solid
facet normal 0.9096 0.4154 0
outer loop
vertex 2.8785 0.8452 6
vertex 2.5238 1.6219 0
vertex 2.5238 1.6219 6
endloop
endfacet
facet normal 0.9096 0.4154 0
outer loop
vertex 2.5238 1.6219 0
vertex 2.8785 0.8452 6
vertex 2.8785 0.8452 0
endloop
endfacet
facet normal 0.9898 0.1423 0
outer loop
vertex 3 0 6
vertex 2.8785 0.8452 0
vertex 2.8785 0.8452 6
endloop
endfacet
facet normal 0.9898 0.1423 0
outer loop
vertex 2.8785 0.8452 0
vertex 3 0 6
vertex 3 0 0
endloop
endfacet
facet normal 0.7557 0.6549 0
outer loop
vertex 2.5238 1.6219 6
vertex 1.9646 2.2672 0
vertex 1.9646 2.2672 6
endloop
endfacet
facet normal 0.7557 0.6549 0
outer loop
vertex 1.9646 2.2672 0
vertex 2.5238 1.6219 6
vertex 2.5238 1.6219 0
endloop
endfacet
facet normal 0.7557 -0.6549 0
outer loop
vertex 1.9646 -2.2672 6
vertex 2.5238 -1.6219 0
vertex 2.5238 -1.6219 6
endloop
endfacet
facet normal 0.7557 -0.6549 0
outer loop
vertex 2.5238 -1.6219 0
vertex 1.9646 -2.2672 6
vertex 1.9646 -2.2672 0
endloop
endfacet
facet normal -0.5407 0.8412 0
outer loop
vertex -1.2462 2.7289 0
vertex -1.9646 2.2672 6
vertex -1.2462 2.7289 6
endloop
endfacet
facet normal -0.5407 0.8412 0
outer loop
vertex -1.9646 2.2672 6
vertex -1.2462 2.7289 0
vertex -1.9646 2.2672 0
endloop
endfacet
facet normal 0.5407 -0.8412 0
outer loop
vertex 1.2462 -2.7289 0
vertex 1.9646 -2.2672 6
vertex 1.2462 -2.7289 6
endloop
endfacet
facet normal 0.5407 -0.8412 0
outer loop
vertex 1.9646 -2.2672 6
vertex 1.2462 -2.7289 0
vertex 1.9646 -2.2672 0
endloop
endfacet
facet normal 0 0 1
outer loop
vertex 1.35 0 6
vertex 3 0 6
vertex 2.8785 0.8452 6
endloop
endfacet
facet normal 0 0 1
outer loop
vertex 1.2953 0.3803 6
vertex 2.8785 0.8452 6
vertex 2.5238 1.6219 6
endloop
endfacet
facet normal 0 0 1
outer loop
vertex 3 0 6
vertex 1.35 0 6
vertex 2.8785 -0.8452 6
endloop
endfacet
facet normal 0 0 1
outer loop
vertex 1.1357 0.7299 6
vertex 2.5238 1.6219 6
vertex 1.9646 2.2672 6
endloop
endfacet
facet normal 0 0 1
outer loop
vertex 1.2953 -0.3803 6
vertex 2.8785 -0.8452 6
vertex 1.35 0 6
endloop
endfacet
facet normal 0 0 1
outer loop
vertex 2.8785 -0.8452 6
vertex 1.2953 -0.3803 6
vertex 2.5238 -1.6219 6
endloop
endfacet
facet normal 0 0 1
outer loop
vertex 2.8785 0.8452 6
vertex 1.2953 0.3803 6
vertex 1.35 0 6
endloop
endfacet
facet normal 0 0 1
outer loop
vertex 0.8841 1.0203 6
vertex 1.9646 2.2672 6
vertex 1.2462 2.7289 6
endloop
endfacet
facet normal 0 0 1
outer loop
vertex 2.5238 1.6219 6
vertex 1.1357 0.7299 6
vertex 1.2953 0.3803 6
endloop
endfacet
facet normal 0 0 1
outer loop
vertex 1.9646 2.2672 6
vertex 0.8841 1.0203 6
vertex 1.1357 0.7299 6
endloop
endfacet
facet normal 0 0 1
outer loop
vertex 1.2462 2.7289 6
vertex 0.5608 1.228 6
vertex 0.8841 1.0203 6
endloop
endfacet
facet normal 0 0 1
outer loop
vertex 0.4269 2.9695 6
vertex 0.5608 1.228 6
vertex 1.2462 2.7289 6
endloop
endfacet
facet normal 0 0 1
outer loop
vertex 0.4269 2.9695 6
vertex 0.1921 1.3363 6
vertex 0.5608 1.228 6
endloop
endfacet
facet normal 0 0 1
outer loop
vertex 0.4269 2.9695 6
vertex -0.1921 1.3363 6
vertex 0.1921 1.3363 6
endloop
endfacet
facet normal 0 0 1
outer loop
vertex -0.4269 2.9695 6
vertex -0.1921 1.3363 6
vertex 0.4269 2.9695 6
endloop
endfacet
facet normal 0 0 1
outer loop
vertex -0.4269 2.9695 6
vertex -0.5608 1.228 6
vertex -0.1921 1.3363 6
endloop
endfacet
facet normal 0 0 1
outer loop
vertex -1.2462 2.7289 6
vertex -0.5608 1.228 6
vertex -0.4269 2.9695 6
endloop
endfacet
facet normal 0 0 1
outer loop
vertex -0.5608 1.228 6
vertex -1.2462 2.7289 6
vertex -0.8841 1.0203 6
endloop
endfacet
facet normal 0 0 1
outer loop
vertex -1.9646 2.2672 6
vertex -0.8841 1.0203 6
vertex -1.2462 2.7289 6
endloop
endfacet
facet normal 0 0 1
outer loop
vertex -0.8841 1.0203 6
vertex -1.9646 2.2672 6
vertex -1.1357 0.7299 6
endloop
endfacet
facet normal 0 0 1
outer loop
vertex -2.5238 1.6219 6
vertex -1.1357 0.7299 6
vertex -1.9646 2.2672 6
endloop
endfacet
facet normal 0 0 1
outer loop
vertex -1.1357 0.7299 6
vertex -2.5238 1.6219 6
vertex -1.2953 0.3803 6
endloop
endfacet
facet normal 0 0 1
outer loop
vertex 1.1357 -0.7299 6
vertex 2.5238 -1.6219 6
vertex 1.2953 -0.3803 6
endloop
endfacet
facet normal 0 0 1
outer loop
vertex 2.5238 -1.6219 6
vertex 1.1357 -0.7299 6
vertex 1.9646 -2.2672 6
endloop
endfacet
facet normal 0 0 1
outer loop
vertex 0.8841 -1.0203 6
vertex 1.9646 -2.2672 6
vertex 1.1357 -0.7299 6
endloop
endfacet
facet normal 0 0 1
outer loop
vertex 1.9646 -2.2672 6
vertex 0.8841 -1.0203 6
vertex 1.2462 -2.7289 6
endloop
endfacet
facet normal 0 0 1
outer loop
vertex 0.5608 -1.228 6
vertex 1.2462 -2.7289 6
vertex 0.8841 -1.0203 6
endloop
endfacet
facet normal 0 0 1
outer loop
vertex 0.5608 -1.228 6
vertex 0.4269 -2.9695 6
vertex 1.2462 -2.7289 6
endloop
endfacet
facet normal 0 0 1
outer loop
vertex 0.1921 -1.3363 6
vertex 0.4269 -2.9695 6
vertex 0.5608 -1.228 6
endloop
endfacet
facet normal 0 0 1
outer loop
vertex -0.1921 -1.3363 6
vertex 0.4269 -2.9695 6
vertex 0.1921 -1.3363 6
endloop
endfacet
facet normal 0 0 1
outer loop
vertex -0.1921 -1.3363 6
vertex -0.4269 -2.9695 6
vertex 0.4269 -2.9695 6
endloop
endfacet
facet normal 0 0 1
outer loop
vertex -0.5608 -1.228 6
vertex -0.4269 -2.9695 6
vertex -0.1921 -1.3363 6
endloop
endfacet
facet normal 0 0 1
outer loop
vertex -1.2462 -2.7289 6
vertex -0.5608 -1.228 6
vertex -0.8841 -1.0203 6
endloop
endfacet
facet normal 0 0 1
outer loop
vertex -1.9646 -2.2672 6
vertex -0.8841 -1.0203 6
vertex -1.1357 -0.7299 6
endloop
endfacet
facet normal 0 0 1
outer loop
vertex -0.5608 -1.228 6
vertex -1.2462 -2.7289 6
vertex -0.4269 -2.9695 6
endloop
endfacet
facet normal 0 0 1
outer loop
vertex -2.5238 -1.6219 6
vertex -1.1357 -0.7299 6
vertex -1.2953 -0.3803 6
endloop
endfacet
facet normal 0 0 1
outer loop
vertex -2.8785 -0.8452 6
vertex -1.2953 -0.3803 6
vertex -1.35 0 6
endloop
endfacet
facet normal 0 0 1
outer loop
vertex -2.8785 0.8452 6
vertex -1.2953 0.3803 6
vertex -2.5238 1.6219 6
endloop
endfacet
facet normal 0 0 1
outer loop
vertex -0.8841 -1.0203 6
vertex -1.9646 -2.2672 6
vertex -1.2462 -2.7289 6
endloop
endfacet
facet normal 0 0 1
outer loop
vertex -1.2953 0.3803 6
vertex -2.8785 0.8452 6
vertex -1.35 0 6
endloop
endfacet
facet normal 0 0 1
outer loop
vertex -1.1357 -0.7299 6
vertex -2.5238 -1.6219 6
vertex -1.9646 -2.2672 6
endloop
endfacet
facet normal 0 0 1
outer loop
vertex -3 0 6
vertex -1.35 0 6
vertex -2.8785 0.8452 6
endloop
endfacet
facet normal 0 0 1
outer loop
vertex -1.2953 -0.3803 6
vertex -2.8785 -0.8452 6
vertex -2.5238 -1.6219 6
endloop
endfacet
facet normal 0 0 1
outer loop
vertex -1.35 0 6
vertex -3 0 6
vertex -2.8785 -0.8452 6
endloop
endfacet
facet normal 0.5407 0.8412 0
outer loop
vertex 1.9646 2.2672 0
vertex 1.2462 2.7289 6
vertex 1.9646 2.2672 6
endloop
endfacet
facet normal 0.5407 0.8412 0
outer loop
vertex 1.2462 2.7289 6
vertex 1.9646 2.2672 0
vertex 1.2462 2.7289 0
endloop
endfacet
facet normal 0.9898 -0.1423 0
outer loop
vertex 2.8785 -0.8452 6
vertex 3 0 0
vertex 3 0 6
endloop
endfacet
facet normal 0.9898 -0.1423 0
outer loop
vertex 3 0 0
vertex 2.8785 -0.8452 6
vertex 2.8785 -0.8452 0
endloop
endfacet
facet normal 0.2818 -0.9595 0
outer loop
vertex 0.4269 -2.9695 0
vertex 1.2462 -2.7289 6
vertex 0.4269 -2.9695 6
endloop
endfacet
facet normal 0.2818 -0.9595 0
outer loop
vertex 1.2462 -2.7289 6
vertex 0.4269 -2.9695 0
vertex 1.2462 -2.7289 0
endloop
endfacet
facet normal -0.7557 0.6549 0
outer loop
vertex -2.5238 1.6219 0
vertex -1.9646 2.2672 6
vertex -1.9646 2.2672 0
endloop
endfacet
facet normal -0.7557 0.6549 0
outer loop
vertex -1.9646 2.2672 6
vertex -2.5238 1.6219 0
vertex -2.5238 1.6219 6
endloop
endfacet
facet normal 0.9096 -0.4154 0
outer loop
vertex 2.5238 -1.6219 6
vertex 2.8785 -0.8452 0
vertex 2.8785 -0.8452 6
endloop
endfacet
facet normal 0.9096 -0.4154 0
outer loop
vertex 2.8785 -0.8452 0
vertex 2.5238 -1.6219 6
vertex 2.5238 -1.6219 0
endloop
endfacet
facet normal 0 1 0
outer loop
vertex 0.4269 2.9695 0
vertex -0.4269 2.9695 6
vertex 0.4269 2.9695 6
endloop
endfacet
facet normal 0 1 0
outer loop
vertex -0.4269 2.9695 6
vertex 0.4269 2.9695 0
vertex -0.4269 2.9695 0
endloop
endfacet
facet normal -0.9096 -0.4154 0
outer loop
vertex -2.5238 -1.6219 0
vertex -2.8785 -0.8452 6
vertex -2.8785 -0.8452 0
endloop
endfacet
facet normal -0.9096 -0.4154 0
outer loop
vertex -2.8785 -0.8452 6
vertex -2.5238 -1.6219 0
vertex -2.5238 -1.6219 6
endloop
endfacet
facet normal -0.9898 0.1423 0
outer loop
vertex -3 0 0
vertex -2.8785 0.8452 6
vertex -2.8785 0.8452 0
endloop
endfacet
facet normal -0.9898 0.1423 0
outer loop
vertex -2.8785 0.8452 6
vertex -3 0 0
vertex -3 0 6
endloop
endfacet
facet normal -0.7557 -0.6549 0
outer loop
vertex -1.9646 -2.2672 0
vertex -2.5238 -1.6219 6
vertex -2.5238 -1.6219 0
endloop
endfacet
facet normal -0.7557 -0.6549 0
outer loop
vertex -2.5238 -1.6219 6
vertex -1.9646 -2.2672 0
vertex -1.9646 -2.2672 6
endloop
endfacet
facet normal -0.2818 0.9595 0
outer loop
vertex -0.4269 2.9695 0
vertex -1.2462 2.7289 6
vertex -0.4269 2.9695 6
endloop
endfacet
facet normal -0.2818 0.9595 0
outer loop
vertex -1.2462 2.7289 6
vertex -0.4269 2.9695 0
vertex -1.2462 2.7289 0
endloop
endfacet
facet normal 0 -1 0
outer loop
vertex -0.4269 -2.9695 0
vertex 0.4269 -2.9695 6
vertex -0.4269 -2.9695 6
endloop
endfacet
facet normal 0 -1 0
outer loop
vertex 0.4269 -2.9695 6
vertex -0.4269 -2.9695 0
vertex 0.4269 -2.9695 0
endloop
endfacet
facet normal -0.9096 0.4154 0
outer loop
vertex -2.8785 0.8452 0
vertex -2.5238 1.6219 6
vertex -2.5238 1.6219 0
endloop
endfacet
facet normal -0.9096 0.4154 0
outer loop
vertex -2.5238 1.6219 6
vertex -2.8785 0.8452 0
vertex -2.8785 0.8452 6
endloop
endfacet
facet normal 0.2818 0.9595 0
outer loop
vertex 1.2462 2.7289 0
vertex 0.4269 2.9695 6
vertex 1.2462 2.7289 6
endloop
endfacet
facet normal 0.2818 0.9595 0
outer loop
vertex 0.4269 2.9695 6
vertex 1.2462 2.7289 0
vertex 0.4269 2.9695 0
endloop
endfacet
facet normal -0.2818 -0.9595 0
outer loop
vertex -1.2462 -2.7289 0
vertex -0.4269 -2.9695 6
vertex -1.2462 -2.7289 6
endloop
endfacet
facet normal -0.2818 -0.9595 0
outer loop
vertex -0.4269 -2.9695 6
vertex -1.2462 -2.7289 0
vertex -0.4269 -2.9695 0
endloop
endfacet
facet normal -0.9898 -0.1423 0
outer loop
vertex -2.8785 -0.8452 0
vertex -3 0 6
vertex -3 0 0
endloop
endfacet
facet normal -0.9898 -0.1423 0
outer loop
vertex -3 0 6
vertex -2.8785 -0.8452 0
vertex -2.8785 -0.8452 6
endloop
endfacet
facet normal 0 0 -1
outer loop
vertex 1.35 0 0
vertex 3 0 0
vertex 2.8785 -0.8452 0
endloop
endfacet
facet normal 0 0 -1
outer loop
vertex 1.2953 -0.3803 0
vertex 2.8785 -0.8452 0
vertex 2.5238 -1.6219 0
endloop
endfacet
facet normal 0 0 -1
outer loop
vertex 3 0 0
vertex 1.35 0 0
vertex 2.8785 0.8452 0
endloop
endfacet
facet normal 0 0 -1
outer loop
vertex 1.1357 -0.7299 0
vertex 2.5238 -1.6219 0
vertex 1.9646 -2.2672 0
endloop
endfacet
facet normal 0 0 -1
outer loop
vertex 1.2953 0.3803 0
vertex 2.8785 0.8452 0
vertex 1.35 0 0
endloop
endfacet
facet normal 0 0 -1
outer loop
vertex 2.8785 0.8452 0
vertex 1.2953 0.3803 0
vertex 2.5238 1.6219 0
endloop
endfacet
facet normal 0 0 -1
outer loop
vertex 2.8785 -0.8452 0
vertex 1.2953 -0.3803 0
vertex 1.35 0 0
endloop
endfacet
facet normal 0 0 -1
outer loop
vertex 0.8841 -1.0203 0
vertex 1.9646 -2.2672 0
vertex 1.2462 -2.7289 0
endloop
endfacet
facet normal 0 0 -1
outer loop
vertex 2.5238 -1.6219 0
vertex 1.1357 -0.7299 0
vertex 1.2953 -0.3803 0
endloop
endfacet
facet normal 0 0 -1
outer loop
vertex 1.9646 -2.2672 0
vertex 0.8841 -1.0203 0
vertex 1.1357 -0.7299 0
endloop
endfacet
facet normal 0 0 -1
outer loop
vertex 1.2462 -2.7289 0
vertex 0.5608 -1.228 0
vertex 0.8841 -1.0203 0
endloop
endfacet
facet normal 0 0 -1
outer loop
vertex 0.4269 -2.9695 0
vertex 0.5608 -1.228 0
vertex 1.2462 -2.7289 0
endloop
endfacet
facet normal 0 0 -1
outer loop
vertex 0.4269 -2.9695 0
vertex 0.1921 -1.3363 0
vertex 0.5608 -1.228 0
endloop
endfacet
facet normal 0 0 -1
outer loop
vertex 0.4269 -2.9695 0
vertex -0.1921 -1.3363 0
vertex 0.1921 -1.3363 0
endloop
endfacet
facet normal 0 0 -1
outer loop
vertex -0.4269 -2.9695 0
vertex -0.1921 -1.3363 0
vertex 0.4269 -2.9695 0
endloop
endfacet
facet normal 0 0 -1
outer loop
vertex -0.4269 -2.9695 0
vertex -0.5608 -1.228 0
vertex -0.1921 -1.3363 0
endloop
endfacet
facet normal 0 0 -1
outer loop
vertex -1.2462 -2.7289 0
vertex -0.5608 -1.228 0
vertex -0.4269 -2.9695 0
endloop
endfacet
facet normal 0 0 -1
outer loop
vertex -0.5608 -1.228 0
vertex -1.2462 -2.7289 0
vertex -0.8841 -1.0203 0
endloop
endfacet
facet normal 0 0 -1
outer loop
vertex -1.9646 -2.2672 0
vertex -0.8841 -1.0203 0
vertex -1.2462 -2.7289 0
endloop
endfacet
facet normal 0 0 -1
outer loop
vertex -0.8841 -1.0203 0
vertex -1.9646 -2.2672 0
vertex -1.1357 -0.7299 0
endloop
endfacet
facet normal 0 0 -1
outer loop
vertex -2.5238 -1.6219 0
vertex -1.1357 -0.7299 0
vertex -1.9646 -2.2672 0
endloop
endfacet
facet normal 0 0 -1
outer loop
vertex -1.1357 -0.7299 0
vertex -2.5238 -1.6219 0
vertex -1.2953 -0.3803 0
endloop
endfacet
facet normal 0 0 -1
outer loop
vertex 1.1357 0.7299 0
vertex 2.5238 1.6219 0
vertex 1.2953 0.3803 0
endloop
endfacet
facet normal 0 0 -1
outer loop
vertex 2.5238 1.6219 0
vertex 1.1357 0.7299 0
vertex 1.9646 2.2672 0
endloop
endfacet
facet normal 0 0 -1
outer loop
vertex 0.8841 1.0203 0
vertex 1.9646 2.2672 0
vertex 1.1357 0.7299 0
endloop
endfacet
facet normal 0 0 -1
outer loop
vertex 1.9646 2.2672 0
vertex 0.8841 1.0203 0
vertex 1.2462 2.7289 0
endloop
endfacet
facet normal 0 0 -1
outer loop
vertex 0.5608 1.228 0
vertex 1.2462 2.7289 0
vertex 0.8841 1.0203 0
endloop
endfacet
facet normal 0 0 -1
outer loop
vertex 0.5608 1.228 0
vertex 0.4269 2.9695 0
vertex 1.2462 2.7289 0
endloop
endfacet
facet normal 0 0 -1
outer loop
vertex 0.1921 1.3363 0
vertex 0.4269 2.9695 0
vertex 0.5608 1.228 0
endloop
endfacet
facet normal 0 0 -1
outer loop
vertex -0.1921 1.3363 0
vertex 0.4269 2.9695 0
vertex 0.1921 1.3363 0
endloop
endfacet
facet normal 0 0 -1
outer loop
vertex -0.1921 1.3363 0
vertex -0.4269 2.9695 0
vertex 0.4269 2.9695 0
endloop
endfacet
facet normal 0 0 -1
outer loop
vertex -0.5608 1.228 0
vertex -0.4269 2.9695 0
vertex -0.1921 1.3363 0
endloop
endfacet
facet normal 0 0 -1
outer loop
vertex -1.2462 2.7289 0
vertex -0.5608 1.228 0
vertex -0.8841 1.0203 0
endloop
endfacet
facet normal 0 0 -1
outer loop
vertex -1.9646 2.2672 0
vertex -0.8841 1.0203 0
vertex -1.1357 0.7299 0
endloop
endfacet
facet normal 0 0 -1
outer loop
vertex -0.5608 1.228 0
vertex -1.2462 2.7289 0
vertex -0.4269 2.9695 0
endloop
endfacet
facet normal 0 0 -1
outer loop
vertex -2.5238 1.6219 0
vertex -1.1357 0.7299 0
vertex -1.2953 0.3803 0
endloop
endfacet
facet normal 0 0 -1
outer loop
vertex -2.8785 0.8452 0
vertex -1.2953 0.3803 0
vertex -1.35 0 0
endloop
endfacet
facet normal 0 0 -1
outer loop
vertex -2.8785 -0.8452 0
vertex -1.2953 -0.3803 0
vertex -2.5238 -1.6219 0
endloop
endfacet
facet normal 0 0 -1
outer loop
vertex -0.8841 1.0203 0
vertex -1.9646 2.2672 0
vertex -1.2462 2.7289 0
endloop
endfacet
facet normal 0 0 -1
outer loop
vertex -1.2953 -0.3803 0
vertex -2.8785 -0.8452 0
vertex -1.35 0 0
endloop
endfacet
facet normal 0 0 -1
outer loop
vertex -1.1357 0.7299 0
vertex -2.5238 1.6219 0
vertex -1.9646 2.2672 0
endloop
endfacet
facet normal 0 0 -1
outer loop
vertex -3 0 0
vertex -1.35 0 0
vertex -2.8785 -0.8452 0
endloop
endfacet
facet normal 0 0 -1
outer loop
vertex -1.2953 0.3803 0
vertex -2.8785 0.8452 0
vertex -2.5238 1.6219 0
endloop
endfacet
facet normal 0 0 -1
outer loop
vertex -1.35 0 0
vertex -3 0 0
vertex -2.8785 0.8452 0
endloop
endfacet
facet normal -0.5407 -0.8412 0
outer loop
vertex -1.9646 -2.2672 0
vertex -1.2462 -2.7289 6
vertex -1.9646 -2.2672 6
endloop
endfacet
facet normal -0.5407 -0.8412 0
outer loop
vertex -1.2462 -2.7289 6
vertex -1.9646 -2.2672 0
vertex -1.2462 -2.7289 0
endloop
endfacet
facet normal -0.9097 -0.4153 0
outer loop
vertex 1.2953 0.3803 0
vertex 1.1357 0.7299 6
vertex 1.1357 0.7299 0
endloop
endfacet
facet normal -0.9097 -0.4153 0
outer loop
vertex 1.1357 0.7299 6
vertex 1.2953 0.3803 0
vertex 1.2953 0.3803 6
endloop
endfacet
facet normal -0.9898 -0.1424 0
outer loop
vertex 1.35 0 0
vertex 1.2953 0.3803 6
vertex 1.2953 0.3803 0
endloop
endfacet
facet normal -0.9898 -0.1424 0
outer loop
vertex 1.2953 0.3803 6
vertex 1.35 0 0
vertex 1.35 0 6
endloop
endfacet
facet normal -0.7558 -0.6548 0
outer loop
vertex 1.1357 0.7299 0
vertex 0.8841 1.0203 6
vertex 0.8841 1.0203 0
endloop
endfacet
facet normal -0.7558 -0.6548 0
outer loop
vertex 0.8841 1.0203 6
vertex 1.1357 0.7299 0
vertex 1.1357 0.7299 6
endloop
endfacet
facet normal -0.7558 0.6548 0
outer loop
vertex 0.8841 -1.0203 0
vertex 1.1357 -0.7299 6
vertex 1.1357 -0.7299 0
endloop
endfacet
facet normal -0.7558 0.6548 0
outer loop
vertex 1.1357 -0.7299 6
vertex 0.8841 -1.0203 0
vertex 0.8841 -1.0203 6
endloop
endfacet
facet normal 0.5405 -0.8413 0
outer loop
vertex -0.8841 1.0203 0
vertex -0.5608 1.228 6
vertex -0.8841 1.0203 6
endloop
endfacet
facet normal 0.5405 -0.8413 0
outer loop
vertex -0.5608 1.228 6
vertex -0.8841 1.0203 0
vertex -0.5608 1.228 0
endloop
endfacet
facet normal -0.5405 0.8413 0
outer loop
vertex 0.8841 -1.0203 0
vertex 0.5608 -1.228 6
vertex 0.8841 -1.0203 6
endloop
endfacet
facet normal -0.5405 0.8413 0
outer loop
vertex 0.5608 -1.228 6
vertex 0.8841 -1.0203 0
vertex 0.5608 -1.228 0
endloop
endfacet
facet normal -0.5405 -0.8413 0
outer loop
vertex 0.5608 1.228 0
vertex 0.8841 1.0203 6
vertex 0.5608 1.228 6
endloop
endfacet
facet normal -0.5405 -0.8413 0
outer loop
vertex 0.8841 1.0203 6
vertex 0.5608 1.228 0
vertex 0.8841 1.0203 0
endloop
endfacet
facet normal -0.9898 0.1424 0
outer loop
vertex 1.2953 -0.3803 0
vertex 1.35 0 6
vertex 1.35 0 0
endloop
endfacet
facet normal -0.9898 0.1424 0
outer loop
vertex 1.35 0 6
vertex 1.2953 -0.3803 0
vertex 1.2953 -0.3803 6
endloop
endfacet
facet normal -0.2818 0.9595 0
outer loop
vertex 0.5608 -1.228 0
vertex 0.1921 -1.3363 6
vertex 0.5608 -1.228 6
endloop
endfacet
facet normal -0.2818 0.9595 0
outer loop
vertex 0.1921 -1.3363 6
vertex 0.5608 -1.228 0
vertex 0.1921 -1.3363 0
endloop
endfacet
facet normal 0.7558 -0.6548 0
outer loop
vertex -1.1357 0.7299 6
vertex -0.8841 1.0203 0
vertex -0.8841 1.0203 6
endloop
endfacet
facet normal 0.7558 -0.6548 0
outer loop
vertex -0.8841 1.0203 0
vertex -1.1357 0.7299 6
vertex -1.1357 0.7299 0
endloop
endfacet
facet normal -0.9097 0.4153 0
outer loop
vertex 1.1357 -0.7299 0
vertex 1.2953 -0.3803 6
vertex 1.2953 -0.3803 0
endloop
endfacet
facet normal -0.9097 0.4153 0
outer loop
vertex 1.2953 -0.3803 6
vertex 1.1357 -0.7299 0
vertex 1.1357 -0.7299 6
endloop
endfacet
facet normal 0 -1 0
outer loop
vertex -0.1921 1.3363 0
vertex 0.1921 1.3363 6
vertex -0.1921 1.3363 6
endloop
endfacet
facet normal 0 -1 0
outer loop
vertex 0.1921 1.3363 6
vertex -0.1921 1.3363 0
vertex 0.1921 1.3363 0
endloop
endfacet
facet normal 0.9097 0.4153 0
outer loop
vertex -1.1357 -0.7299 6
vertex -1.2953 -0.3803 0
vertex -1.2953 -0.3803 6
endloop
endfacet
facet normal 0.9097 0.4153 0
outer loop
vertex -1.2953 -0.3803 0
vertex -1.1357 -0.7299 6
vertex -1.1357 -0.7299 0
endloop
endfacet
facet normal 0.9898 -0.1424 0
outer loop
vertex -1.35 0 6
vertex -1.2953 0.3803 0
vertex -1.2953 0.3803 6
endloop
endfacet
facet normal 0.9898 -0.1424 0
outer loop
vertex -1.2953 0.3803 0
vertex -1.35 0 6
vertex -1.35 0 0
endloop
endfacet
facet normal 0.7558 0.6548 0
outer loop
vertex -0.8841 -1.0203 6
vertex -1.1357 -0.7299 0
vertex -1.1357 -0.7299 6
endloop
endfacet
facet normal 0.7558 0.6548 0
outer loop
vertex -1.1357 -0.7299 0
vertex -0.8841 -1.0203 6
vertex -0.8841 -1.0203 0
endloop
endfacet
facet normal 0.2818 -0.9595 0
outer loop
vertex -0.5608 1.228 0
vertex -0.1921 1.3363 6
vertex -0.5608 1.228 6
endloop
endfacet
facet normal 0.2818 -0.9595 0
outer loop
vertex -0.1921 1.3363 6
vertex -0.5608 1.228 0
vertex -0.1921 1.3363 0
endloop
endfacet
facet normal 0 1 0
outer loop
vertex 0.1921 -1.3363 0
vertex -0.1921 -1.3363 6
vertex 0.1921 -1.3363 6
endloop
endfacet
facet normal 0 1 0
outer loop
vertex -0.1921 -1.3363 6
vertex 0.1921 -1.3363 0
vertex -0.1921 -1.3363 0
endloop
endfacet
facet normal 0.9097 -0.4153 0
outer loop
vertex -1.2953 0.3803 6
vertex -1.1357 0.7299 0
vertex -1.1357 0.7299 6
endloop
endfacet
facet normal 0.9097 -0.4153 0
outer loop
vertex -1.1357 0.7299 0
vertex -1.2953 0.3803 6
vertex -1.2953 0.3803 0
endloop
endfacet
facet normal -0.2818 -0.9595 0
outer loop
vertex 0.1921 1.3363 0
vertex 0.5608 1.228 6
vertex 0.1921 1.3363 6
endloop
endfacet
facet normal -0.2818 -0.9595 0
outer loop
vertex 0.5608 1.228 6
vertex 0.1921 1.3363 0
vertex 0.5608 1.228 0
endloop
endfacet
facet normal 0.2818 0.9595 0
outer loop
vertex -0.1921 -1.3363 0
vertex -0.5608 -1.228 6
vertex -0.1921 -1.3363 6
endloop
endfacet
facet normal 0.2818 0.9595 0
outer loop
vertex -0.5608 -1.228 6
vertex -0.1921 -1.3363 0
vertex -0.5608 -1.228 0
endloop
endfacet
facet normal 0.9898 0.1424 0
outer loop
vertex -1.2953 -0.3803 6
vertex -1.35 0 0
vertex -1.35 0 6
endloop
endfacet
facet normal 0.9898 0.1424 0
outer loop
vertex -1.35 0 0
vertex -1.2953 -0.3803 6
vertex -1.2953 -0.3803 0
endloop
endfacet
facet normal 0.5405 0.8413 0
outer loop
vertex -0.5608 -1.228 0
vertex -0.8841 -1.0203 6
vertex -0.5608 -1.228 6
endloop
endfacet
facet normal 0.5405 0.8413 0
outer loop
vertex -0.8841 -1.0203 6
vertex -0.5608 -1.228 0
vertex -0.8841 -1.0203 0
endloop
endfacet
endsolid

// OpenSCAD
difference() {
    cylinder(h=6,r=3,$fn=22);
    
    cylinder(h=6,r=1.35,$fn=22);
}
